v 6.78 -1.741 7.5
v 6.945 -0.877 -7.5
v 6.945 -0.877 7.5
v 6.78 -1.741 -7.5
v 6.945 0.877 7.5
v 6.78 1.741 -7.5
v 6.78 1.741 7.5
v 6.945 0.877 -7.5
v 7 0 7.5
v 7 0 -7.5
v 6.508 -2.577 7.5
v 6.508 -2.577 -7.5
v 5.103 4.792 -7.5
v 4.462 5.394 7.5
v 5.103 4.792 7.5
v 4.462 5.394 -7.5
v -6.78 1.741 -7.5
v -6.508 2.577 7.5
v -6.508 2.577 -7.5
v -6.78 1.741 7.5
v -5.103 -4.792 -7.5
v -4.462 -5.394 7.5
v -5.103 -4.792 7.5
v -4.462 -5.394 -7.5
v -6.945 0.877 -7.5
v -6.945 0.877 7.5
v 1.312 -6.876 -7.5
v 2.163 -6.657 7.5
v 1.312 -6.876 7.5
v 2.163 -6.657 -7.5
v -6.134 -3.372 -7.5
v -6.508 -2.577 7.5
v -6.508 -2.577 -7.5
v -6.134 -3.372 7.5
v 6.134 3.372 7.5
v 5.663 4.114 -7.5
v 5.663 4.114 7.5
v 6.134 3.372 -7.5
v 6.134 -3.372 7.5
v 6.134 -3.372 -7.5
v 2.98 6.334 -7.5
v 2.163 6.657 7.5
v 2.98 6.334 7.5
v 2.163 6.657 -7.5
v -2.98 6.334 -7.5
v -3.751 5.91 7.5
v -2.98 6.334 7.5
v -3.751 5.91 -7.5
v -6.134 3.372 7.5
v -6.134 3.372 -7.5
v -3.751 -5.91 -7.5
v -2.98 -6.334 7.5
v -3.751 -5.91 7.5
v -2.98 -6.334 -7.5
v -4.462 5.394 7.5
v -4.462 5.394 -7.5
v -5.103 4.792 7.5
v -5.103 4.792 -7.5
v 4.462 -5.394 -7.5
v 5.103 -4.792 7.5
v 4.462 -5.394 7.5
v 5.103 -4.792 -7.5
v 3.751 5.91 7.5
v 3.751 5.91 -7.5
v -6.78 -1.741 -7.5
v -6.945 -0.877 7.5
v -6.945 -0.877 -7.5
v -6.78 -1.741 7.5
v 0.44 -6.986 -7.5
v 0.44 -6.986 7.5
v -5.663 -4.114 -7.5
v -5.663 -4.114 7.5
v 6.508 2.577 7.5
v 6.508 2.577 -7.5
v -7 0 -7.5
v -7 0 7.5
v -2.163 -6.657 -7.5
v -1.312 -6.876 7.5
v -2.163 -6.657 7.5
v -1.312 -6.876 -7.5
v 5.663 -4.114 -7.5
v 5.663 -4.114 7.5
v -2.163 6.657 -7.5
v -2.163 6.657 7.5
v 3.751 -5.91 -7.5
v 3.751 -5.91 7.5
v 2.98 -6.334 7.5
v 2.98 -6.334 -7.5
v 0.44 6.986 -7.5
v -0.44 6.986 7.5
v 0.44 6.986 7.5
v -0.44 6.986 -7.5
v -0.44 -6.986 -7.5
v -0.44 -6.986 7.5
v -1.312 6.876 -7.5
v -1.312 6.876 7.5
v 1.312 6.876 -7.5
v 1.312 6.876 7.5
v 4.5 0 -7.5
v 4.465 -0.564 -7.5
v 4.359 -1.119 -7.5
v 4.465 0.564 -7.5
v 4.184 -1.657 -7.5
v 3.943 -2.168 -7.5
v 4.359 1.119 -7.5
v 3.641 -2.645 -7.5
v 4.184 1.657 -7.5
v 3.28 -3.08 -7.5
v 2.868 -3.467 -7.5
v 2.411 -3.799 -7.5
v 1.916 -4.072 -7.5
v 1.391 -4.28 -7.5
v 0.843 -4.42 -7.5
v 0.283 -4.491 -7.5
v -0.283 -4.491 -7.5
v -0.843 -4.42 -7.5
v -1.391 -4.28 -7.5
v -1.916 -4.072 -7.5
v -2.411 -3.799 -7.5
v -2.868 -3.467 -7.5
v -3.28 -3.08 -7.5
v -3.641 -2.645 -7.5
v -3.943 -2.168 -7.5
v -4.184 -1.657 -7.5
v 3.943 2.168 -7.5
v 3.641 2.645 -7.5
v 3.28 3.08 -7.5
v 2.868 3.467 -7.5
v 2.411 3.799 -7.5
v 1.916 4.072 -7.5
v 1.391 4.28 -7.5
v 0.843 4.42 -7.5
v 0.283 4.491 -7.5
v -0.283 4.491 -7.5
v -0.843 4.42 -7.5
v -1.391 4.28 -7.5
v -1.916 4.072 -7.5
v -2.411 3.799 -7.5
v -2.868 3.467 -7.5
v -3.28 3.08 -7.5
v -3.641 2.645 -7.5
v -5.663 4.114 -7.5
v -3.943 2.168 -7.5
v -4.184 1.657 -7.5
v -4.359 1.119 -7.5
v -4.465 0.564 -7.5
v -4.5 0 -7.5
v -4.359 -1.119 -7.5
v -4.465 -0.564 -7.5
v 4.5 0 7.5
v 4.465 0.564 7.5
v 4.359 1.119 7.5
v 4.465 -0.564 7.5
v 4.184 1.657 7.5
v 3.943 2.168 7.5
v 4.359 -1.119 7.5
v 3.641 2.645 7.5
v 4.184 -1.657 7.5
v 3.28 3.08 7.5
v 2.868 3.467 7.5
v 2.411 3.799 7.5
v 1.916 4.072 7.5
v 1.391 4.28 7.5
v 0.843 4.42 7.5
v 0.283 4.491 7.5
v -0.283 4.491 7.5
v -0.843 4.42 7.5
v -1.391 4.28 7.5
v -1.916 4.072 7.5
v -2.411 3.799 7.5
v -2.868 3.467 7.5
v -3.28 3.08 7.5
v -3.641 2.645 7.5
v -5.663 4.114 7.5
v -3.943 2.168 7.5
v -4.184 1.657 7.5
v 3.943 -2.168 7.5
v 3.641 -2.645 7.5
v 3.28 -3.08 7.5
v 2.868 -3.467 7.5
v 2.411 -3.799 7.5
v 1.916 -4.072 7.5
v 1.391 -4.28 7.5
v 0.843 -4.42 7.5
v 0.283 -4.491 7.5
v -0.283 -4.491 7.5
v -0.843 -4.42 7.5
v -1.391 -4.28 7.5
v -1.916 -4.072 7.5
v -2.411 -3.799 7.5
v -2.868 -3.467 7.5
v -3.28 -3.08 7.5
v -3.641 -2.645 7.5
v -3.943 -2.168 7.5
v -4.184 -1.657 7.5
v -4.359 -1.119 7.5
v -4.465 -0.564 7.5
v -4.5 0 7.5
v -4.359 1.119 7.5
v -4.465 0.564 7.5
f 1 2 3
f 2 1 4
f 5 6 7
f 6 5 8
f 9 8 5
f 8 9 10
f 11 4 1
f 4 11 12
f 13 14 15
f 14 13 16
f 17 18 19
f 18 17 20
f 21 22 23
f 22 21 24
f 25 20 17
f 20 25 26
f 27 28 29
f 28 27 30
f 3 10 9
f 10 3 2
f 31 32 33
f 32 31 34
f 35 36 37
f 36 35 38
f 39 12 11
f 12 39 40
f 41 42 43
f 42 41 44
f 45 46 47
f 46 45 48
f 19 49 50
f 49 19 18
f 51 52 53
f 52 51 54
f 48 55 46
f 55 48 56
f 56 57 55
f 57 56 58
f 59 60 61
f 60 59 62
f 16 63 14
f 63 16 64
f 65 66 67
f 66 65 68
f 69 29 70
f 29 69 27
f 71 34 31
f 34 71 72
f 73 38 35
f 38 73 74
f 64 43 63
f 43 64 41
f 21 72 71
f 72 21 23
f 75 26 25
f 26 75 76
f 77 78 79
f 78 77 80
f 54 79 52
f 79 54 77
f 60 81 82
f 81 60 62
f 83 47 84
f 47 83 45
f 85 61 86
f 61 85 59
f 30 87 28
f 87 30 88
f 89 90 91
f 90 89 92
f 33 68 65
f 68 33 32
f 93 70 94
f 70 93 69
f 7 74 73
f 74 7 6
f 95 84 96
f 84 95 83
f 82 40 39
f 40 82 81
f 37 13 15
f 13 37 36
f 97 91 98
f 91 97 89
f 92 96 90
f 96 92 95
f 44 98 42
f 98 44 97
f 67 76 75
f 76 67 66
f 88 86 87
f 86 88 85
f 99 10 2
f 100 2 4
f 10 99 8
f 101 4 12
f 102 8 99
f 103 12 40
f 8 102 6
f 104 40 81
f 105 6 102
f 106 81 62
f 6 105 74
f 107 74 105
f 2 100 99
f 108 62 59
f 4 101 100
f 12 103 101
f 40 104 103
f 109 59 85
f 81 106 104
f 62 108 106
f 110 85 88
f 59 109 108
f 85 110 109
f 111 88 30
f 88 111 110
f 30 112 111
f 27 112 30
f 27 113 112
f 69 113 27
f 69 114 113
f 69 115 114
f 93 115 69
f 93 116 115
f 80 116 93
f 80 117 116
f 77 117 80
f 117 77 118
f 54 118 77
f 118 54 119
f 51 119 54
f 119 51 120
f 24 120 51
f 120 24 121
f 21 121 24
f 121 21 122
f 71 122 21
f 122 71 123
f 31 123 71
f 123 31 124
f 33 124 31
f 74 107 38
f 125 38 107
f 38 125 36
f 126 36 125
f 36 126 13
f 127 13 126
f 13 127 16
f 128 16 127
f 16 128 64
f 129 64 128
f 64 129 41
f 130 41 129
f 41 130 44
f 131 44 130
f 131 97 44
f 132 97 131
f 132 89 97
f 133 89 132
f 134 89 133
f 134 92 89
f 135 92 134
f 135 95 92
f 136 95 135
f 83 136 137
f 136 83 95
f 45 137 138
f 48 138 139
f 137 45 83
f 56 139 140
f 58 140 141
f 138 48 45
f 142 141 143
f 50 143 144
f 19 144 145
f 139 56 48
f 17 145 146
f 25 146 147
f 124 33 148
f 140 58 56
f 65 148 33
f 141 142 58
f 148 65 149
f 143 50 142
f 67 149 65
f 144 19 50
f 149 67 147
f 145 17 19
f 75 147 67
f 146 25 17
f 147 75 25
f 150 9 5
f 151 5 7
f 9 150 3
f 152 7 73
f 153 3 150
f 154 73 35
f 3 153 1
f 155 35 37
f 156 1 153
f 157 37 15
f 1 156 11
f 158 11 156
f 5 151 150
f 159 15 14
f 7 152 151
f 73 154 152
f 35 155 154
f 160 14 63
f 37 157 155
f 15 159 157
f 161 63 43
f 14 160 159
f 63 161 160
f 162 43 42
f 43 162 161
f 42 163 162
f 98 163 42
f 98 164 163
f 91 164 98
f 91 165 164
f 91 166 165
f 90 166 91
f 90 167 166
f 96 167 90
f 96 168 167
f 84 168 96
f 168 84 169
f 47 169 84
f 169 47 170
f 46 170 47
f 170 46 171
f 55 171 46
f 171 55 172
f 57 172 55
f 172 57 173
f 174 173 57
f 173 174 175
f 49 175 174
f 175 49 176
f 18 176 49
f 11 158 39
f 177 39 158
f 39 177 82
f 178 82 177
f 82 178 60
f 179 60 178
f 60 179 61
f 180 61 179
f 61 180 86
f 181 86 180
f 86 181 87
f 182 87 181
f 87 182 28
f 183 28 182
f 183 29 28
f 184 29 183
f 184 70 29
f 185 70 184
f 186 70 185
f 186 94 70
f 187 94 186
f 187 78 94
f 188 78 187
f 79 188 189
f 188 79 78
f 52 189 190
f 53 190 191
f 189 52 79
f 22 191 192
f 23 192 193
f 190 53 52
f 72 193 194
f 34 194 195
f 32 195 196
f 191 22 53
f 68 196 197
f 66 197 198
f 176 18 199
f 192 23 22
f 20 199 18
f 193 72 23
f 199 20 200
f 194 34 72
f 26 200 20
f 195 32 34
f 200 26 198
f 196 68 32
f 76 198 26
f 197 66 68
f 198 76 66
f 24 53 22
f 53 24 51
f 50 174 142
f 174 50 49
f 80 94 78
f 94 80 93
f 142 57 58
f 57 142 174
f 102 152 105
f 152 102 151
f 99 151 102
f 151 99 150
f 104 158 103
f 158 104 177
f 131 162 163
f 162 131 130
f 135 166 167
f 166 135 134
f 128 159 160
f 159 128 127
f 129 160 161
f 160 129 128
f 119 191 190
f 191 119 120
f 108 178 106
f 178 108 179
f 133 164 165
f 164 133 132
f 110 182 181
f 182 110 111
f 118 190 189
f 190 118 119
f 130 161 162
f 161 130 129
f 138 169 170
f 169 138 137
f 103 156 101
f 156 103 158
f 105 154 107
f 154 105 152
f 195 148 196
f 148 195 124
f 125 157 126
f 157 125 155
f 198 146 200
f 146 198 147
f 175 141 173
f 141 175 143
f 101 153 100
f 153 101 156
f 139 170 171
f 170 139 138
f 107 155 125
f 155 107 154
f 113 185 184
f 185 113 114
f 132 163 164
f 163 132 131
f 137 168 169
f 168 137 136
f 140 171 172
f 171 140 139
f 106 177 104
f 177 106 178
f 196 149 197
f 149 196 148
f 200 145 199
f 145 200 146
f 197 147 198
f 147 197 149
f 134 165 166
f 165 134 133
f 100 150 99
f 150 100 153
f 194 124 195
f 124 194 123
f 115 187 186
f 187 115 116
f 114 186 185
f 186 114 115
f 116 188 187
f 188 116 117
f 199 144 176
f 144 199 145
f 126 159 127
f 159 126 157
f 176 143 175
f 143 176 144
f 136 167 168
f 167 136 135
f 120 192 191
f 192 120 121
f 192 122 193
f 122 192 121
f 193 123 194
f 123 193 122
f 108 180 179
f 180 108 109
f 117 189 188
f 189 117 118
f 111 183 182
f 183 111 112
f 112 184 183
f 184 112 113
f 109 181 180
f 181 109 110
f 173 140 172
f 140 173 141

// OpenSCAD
$fn = 50;


difference() {
	union() {
		translate(v = [0, 0, -7.5000000000]) {
			cylinder(h = 15, r = 7.0000000000);
		}
	}
	union() {
		translate(v = [0, 0, -100.0000000000]) {
			cylinder(h = 200, r = 4.5000000000);
		}
	}
}
